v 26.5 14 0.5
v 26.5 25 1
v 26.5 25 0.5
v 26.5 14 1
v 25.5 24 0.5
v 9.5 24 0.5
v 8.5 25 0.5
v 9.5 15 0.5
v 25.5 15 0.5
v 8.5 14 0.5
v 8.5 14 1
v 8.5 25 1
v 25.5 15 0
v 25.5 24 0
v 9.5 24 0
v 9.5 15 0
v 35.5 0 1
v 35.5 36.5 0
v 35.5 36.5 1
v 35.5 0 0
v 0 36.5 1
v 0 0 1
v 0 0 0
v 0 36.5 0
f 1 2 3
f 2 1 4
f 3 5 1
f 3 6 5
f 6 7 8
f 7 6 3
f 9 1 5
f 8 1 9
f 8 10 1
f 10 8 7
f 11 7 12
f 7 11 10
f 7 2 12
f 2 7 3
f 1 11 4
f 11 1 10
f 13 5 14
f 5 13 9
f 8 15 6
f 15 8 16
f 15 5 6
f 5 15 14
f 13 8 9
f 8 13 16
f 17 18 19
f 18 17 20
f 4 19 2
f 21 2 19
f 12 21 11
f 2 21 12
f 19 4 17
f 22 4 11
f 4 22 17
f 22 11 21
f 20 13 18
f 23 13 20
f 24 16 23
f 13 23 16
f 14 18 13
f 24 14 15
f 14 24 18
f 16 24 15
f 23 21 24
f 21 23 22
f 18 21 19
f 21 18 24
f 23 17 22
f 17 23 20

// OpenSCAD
// file: mod_window.scad
/// @file mod_window.scad
///
/// @brief module- standard window opening
///
/// @author © Dave Harris 2022
/// 

module window(x, y, w, h)
{
    translate( // glazing rebate
      [ x -1
      , y -1
      , 0.5  ]
    ) cube(
        [ w +2
        , h +2
        , 2  ]
      );
    
    translate( // punch opening
      [ x
      , y
      , -0.5  ]
    ) cube(
        [ w
        , h
        , 2.5  ]
      ); 
    
}; // end module window

// eof
// file: fb_globals.scad
/// @file fb_globals.scad
///
/// @brief project footbridge globals
///
/// @author © Dave Harris 2022
///
/// Included in all project files.


$fa = 1;   // Fragment angle
$fs = 0.4; // Fragment size resolution

// global constants
//------------------

H_canopy = 47;

H_bridge = 49.5; // platform<>bridge
W_bridge = 36;   // width of bridge
                 // > walkway
W_walk   = 34.5; // width
H_walk   = 36;   // height of walkway


Steps    = 27;   // number of steps
W_stairs = 32;   // width ~ 9'6" @ H0
L_tread  = 3.5;  // tread ~ 12" @ H0
L_stairs = L_tread * (Steps +1);
H_rise   = H_bridge / (Steps +1); 
  // rise is 1.7678, not H0 1.75 (6")

W_lift   = 34;

W_build  = W_stairs +2;
L_build  = L_stairs+W_bridge+W_lift +2;

W_pillar = 4;

L_spacing = L_build /2;

Spans = 6;

L_canopy = ((Spans -1) * L_spacing) + W_pillar;

echo("len",L_canopy);

H_door   = 28;
W_door   = 18;

H_window = 6;
W_window = 16;


W_plat45  = 93.9;
W_track34 = 87.9;
W_plat23  = 93.8;
W_track12 = 87.9;

W_plat23edge =
   ( W_plat23 - W_stairs +2 ) /2 ;
W_plat45edge =
   ( W_plat45 - W_stairs +2 ) /2 ;
   
L_span34 = W_track34 + W_plat45edge + W_plat23edge;

L_span12 = 136.5;

W_grider = 2.2;

W_LEDstrip = 7.5;



// eof
// main file
/// @file fb_endWall.scad
///
/// @brief footbridge endWall
///
/// @author © Dave Harris 2022
///

include<fb_globals.scad>
use<mod_window.scad>

difference()
{
   cube(
     [ 35.5, 36.5, 1 ]
   );

  window(
       9.5
     , 15  // 48.7+15=63.7
     , W_window
     , 9 
   );

}
